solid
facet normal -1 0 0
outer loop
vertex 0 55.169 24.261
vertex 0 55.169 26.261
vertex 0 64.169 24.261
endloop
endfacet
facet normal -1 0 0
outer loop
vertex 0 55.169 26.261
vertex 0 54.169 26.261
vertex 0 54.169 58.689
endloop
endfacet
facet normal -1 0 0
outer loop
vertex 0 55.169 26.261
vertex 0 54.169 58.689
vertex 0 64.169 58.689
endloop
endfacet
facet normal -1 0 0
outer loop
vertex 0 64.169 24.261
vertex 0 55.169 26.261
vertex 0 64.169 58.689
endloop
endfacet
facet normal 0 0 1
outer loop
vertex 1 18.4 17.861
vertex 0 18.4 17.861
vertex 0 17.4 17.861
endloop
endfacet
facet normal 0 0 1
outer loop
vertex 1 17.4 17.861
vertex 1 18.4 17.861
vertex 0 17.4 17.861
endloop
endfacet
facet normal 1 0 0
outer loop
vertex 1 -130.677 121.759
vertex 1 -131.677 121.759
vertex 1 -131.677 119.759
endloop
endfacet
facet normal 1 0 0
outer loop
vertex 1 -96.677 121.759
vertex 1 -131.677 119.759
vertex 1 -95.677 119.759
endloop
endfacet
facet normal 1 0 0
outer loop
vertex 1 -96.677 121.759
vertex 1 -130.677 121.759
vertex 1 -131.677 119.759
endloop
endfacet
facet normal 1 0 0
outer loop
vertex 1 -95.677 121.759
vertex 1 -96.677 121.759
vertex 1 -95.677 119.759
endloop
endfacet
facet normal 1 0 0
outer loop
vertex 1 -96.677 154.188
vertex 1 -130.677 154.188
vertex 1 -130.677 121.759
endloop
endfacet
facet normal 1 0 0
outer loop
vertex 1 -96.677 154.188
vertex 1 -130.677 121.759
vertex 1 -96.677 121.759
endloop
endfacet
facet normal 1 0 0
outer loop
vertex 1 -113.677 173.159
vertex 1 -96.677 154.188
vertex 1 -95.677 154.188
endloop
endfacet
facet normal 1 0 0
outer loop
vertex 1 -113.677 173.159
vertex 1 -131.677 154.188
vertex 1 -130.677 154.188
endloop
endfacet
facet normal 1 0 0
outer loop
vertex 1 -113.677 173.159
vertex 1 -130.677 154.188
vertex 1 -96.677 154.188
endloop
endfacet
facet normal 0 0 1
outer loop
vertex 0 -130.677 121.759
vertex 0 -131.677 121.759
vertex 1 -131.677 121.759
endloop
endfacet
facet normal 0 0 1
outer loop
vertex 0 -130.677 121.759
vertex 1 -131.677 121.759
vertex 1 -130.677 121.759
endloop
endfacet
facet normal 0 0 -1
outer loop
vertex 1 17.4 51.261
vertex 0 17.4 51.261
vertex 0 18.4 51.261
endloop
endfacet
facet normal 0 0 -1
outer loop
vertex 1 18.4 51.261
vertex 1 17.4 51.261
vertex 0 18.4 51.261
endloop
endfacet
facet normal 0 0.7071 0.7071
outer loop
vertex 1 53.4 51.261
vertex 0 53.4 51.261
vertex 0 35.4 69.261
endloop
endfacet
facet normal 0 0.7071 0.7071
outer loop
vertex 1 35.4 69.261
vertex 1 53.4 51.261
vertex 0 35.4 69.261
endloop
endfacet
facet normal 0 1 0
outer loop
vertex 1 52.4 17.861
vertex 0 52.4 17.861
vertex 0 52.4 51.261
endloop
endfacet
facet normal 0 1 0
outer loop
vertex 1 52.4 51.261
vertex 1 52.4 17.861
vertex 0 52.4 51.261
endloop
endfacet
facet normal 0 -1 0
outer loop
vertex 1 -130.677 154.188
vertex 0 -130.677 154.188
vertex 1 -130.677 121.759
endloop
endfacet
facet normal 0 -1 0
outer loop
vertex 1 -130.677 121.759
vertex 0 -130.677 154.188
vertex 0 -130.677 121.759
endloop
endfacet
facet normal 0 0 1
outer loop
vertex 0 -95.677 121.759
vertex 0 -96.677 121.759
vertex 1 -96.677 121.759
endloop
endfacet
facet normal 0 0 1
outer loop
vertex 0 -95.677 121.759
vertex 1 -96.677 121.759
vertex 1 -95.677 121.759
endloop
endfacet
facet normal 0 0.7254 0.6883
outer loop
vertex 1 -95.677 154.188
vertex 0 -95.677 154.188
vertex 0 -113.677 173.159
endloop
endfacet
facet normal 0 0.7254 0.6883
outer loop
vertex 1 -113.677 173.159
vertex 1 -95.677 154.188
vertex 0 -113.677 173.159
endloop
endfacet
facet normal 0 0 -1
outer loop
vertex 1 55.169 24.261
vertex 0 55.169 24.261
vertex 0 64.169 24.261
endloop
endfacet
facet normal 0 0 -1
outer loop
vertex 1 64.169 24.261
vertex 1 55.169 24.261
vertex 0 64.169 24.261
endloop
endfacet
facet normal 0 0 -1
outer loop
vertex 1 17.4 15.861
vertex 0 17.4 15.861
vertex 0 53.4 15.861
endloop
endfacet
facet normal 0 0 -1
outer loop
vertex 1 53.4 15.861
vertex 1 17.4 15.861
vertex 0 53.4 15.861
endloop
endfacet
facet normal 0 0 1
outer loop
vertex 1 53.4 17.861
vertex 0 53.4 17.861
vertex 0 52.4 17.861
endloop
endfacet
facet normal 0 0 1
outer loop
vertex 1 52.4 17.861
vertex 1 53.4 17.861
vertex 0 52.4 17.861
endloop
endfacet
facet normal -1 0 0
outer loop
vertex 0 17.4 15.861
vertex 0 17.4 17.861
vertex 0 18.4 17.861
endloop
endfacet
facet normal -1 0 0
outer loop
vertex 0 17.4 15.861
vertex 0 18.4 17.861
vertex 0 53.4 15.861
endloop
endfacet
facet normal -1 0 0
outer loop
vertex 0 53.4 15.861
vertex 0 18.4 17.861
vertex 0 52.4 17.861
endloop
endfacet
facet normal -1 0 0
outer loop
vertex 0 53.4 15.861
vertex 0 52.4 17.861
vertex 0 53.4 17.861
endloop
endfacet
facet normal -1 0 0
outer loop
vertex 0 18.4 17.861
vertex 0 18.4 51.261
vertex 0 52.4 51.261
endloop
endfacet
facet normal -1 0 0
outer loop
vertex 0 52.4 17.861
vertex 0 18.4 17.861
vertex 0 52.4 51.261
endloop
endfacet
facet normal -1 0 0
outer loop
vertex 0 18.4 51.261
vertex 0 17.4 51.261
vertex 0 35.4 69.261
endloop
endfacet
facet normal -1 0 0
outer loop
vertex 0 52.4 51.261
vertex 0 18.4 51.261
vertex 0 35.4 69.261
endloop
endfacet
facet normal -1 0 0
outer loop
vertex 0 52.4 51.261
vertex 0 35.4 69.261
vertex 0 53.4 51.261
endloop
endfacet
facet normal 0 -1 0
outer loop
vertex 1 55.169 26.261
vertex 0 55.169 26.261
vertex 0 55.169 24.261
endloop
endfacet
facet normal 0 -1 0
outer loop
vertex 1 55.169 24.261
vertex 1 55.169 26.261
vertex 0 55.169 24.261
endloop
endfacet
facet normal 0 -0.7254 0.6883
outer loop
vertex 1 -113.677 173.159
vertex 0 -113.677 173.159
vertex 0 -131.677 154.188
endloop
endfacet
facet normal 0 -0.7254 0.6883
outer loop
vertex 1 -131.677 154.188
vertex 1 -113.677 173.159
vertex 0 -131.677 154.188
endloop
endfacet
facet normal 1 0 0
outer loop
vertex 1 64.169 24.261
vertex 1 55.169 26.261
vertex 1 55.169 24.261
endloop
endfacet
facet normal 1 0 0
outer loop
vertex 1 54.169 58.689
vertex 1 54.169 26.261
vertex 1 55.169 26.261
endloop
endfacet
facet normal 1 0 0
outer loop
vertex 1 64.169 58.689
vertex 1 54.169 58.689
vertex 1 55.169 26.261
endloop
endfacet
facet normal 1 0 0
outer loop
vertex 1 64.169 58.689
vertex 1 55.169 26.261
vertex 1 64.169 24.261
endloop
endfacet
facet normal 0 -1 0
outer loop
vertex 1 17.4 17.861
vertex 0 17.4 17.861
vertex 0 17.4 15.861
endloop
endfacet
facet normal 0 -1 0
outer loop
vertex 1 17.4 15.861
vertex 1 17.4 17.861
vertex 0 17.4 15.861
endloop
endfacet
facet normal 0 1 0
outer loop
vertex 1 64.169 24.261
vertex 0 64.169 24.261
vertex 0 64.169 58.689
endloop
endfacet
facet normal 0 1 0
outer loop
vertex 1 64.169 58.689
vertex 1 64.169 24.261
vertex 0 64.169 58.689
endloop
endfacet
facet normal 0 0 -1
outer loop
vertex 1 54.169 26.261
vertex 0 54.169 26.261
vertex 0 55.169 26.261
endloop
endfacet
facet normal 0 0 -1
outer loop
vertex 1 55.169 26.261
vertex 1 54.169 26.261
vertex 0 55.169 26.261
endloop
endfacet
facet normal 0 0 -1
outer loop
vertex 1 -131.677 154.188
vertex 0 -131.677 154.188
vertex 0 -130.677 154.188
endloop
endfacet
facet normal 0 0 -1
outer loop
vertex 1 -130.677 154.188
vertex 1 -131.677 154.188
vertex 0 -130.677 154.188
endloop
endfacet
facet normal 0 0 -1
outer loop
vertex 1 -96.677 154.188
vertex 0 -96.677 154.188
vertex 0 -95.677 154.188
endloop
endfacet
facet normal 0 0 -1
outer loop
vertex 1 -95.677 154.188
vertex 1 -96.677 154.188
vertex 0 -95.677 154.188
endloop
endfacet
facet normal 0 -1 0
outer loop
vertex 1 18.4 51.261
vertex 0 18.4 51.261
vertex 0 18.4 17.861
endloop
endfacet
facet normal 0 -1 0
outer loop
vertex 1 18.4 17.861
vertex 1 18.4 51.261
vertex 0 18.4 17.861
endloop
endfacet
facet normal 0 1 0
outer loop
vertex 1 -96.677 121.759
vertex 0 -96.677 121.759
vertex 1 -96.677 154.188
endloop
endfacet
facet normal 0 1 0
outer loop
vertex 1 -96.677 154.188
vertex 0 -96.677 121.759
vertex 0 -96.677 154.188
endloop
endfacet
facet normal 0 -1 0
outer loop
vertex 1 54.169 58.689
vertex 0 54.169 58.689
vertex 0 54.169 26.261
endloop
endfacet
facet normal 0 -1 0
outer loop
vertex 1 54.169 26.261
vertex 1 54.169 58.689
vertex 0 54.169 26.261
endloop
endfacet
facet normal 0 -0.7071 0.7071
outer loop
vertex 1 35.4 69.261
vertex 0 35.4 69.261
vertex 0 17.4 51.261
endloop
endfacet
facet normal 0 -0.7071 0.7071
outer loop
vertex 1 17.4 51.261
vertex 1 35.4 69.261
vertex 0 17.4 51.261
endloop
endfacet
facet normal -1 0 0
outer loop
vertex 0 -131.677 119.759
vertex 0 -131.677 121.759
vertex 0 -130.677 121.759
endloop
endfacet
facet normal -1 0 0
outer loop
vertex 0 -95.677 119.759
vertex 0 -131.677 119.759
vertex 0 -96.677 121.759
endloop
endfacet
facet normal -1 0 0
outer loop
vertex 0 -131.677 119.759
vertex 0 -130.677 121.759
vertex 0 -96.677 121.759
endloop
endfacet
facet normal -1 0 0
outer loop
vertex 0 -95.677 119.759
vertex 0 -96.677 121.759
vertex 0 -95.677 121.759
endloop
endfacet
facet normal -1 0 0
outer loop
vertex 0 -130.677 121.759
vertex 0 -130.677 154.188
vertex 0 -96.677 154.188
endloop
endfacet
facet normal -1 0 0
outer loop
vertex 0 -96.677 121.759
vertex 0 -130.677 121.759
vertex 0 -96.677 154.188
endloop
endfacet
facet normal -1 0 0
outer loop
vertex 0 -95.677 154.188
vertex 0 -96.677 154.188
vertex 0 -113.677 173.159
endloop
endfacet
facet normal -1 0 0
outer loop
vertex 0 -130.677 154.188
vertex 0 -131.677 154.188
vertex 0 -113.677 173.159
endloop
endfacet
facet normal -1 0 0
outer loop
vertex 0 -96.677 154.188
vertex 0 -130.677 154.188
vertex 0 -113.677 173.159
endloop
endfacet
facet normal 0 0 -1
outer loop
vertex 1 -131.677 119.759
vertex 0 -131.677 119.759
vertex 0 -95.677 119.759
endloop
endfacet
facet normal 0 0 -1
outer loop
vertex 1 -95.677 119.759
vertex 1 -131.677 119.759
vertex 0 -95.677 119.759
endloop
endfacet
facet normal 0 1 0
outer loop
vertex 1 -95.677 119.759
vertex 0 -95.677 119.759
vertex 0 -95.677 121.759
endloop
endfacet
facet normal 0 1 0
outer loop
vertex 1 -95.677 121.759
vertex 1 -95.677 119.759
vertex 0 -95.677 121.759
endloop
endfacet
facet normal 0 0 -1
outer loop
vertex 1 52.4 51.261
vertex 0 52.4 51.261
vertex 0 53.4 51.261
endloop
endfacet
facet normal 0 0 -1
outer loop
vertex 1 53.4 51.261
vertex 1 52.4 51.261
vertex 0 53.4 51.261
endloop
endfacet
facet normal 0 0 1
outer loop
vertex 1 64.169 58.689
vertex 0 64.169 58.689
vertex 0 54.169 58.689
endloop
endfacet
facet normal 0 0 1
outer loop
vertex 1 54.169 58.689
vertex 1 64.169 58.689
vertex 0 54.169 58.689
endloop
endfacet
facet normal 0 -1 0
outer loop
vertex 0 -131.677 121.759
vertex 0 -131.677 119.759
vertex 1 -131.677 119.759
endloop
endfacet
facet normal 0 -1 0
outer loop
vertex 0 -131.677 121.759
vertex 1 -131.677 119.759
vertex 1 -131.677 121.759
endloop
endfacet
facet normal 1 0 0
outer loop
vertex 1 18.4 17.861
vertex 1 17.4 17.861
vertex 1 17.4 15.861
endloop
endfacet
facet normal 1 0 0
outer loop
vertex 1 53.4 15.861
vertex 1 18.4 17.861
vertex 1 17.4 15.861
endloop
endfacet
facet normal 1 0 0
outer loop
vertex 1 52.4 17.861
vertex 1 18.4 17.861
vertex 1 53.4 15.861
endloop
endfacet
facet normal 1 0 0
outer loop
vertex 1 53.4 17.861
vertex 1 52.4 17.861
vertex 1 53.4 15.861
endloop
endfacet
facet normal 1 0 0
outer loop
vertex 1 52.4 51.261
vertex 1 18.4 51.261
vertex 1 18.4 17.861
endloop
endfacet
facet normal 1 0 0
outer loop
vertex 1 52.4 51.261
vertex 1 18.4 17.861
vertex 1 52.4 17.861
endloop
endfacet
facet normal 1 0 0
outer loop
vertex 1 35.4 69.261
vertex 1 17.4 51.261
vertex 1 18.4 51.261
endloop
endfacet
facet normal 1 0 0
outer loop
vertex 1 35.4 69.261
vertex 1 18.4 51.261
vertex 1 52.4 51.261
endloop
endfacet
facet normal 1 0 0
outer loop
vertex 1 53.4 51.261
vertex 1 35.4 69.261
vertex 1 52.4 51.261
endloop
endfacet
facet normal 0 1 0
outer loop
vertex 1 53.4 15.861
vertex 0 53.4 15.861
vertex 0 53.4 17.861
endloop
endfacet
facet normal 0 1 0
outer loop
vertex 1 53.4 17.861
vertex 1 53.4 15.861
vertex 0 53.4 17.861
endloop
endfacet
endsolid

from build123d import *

# Parameters (mm, degrees)
F1_DEPTH = 1
F2_DEPTH = 1
F0_W     = 1
F0_H     = 2
F3_DEPTH = 1


with BuildPart() as f1:
    # F0 (on Right) → F1 (new body)
    with BuildSketch(Plane.YZ):
        Polygon((53.3996237096, 51.2606592213), (35.3996237096, 69.2606592213), (17.3996237096, 51.2606592213), (18.3996237096, 51.2606592213), (18.3996237096, 26.2606592213), (18.3996237096, 17.8606592213), (17.3996237096, 17.8606592213), (17.3996237096, 15.8606592213), (53.3996237096, 15.8606592213), (53.3996237096, 17.8606592213), (52.3996237096, 17.8606592213), (52.3996237096, 24.2606592213), (52.3996237096, 26.2606592213), (52.3996237096, 51.2606592213), align=None)
    extrude(amount=F1_DEPTH)


with BuildPart() as f1b:
    # F0 (on Right) → F1, piece 2 (new body)
    with BuildSketch(Plane.YZ):
        Polygon((55.1692863107, 26.2606592213), (55.1692863107, 24.2606592213), (62.1692863107, 24.2606592213), (64.1692863107, 24.2606592213), (64.1692863107, 58.6886592213), (62.1692863107, 58.6886592213), (54.1692863107, 58.6886592213), (54.1692863107, 56.6886592213), (54.1692863107, 26.2606592213), align=None)
    extrude(amount=F1_DEPTH)


with BuildPart() as f1c:
    # F0 (on Right) → F1, piece 3 (new body)
    with BuildSketch(Plane.YZ):
        Polygon((-113.677120924, 154.1882742229), (-130.677120924, 154.1882742229), (-130.677120924, 121.7591796517), (-130.677120924, 119.7591796517), (-113.677120924, 119.7591796517), align=None)
    extrude(amount=F1_DEPTH)

    # F0 (on Right) → F2 (join)
    with BuildSketch(Plane.YZ):
        Polygon((-96.677120924, 154.1882742229), (-113.677120924, 154.1882742229), (-113.677120924, 119.7591796517), (-96.677120924, 119.7591796517), (-96.677120924, 121.7591796517), align=None)
        Polygon((-95.677120924, 154.1882742229), (-113.677120924, 173.1591796517), (-113.677120924, 154.1882742229), (-96.677120924, 154.1882742229), align=None)
        Polygon((-113.677120924, 173.1591796517), (-131.677120924, 154.1882742229), (-130.677120924, 154.1882742229), (-113.677120924, 154.1882742229), align=None)
        Polygon((-113.677120924, 154.1882742229), (-130.677120924, 154.1882742229), (-130.677120924, 121.7591796517), (-130.677120924, 119.7591796517), (-113.677120924, 119.7591796517), align=None)
    extrude(amount=F2_DEPTH)

    # F0 (on Right) → F3 (join)
    with BuildSketch(Plane.YZ):
        with Locations((-131.177120924, 120.7591796517)):
            Rectangle(F0_W, F0_H)
        with Locations((-96.177120924, 120.7591796517)):
            Rectangle(F0_W, F0_H)
    extrude(amount=F3_DEPTH)


solid = Compound([f1.part, f1b.part, f1c.part])
